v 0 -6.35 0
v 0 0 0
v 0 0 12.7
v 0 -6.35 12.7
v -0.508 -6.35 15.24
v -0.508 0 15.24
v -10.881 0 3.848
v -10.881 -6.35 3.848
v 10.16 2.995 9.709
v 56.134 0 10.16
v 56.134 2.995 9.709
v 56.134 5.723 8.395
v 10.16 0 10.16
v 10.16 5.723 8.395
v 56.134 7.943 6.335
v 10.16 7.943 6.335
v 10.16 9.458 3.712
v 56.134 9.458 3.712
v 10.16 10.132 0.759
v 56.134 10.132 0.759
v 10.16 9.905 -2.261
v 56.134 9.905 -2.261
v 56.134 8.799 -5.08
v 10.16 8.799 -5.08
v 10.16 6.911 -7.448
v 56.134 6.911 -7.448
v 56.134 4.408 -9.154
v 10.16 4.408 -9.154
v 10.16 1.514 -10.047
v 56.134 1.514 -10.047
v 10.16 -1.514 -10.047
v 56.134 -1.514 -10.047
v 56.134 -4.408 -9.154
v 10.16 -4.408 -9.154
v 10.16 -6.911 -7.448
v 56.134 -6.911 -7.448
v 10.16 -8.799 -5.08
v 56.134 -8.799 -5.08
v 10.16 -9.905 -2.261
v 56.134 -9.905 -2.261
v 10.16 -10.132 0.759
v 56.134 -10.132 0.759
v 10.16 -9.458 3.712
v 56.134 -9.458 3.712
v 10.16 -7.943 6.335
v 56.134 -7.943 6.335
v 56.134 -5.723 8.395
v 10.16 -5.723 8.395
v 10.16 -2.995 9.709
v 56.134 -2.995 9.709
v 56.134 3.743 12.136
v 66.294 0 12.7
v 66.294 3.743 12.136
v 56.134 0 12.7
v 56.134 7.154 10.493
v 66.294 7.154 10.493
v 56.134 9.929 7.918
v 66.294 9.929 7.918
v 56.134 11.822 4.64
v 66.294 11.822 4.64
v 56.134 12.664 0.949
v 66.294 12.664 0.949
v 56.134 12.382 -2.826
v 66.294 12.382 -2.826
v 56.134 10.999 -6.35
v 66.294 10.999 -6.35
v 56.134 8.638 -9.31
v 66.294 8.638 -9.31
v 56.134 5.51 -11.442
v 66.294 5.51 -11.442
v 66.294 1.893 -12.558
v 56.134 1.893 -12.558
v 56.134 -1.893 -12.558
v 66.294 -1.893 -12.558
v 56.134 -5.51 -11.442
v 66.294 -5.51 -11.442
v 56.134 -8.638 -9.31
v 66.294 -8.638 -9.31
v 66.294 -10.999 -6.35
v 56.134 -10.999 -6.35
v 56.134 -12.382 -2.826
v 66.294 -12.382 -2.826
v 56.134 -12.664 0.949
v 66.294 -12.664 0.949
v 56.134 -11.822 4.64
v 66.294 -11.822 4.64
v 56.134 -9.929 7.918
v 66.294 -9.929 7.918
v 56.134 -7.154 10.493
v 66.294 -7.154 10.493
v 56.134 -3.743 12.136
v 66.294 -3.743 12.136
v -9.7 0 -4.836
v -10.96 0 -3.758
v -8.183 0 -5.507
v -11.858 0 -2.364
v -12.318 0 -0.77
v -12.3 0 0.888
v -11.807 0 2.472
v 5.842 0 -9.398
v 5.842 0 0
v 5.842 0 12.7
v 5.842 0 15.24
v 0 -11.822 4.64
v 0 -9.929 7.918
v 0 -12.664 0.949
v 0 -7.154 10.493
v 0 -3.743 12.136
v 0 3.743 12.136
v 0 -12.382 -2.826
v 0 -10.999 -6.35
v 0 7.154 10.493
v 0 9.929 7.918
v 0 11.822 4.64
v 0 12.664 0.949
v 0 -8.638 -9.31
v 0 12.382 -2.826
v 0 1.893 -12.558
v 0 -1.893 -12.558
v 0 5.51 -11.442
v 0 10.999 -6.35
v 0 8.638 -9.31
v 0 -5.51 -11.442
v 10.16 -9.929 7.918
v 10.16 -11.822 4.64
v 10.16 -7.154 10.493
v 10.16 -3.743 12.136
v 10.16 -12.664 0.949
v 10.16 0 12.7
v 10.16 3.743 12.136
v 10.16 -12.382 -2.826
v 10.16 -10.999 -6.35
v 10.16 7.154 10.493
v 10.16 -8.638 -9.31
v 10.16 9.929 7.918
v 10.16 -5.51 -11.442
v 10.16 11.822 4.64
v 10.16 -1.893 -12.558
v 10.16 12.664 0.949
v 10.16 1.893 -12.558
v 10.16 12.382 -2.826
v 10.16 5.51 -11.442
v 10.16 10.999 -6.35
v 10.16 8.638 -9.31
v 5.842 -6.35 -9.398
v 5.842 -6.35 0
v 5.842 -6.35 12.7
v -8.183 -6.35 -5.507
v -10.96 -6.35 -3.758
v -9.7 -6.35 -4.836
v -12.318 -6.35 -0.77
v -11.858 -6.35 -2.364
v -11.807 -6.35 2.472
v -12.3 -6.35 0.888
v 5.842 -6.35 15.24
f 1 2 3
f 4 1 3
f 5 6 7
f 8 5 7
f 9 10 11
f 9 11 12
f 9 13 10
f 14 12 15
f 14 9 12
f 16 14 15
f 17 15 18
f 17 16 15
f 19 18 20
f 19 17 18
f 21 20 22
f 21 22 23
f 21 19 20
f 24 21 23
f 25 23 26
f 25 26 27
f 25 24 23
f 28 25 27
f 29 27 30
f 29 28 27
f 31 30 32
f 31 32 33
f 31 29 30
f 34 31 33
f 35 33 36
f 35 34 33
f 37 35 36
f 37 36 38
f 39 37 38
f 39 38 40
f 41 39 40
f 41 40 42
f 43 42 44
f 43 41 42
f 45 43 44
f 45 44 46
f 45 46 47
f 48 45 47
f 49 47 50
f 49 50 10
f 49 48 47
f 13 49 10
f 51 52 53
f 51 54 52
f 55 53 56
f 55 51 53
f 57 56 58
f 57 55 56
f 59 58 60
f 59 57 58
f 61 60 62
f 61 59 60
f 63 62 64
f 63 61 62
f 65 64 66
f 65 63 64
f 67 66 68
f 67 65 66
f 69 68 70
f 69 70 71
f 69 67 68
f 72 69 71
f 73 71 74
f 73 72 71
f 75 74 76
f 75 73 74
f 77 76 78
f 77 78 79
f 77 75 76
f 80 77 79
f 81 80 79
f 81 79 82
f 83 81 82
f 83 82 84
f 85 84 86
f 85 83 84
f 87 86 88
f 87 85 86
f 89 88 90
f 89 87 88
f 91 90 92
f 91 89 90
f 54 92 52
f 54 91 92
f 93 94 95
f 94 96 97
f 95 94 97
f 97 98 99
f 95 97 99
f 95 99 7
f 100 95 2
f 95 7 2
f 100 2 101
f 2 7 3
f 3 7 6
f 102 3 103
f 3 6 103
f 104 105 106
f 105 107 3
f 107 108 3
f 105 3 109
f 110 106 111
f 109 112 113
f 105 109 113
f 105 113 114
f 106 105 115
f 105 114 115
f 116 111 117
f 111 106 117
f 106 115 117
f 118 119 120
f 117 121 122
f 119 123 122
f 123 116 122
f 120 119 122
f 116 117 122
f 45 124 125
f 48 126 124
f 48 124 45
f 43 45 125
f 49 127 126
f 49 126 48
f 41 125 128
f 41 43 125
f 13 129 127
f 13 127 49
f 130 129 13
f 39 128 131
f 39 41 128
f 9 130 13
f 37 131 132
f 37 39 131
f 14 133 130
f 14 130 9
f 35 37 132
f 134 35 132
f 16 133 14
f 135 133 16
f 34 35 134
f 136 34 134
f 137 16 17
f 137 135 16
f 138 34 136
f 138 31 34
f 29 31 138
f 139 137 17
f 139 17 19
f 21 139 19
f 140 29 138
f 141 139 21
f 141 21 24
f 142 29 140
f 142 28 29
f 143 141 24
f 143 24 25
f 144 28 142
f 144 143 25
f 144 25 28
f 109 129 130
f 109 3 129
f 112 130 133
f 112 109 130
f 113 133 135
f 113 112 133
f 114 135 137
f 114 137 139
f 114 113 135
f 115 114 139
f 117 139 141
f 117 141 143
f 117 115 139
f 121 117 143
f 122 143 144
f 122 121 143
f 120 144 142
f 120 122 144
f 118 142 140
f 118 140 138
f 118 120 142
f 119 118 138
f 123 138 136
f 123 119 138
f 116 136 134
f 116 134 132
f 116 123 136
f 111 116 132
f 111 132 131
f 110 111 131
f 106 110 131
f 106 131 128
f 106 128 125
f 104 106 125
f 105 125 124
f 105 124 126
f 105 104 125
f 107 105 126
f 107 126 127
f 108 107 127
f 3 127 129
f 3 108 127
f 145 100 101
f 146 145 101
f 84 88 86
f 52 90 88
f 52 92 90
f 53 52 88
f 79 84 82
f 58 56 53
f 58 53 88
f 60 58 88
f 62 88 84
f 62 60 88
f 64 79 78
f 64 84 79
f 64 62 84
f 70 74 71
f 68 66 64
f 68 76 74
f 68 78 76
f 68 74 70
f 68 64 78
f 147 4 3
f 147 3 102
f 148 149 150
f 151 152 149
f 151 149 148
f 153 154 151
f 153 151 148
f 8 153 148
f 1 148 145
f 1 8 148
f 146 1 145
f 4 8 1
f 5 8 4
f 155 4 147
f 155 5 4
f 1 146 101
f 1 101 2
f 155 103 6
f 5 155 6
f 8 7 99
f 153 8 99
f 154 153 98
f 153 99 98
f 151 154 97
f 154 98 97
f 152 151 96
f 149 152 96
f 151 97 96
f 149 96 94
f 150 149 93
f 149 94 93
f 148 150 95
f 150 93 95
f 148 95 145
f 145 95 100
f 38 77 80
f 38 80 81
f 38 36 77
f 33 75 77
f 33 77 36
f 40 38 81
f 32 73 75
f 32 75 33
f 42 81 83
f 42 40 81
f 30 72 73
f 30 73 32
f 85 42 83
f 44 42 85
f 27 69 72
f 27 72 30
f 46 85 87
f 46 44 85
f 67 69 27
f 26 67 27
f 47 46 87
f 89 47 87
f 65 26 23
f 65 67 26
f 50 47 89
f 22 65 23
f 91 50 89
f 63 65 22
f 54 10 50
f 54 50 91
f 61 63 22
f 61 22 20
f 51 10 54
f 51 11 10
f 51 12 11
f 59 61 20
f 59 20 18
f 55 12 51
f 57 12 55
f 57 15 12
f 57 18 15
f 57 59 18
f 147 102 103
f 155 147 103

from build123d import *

# Parameters (mm, degrees)
F0_W     = 5.842
F0_H     = 12.7
F0_R     = 3.175
F2_DEPTH = 6.35
F3_DEPTH = 12.701


with BuildPart() as f1:
    # F0 (on Front) → F1 (revolve)
    with BuildSketch(Plane.XZ):
        Polygon((5.842, 12.7), (5.842, 0), (66.294, 0), (66.294, 12.7), (56.134, 12.7), (56.134, 10.16), (10.16, 10.16), (10.16, 12.7), align=None)
        with Locations((2.921, 6.35)):
            Rectangle(F0_W, F0_H)
    revolve(axis=Axis((33.147, 0, 0), (-1, 0, 0)))

    # F0 (on Front) → F3 (cut, through all)
    with BuildSketch(Plane.XZ):
        with Locations((-6.6548, 0)):
            Circle(F0_R)
    extrude(amount=-F3_DEPTH, mode=Mode.SUBTRACT)


with BuildPart() as f2:
    # F0 (on Front) → F2 (new body)
    with BuildSketch(Plane.XZ):
        with BuildLine():
            Line((-0.9398, 0), (0, 0))
            Line((0, 0), (0, 12.7))
            Line((0, 12.7), (5.842, 12.7))
            Line((5.842, 12.7), (5.842, 15.24))
            Line((5.842, 15.24), (-0.508, 15.24))
            Line((-0.508, 15.24), (-10.8806298187, 3.8475430269))
            ThreePointArc((-10.8806298187, 3.8475430269), (-4.5919612295, 5.3297205562), (-0.9398, 0))
        make_face()
        with BuildLine():
            ThreePointArc((-8.1826630726, -5.5069827884), (-3.1957909266, -4.5493385486), (-0.9398, 0))
            ThreePointArc((-0.9398, 0), (-4.5919612295, 5.3297205562), (-10.8806298187, 3.8475430269))
            ThreePointArc((-10.8806298187, 3.8475430269), (-12.1459778134, -1.5837270034), (-8.1826630726, -5.5069827884))
        make_face()
        with Locations((-6.6548, 0)):
            Circle(F0_R, mode=Mode.SUBTRACT)
        with Locations((-6.6548, 0)):
            Circle(F0_R)
        with BuildLine():
            Line((5.842, 0), (0, 0))
            Line((0, 0), (-0.9398, 0))
            ThreePointArc((-0.9398, 0), (-3.1957909266, -4.5493385486), (-8.1826630726, -5.5069827884))
            Line((-8.1826630726, -5.5069827884), (5.842, -9.398))
            Line((5.842, -9.398), (5.842, 0))
        make_face()
    extrude(amount=F2_DEPTH)


solid = Compound([f1.part, f2.part])
